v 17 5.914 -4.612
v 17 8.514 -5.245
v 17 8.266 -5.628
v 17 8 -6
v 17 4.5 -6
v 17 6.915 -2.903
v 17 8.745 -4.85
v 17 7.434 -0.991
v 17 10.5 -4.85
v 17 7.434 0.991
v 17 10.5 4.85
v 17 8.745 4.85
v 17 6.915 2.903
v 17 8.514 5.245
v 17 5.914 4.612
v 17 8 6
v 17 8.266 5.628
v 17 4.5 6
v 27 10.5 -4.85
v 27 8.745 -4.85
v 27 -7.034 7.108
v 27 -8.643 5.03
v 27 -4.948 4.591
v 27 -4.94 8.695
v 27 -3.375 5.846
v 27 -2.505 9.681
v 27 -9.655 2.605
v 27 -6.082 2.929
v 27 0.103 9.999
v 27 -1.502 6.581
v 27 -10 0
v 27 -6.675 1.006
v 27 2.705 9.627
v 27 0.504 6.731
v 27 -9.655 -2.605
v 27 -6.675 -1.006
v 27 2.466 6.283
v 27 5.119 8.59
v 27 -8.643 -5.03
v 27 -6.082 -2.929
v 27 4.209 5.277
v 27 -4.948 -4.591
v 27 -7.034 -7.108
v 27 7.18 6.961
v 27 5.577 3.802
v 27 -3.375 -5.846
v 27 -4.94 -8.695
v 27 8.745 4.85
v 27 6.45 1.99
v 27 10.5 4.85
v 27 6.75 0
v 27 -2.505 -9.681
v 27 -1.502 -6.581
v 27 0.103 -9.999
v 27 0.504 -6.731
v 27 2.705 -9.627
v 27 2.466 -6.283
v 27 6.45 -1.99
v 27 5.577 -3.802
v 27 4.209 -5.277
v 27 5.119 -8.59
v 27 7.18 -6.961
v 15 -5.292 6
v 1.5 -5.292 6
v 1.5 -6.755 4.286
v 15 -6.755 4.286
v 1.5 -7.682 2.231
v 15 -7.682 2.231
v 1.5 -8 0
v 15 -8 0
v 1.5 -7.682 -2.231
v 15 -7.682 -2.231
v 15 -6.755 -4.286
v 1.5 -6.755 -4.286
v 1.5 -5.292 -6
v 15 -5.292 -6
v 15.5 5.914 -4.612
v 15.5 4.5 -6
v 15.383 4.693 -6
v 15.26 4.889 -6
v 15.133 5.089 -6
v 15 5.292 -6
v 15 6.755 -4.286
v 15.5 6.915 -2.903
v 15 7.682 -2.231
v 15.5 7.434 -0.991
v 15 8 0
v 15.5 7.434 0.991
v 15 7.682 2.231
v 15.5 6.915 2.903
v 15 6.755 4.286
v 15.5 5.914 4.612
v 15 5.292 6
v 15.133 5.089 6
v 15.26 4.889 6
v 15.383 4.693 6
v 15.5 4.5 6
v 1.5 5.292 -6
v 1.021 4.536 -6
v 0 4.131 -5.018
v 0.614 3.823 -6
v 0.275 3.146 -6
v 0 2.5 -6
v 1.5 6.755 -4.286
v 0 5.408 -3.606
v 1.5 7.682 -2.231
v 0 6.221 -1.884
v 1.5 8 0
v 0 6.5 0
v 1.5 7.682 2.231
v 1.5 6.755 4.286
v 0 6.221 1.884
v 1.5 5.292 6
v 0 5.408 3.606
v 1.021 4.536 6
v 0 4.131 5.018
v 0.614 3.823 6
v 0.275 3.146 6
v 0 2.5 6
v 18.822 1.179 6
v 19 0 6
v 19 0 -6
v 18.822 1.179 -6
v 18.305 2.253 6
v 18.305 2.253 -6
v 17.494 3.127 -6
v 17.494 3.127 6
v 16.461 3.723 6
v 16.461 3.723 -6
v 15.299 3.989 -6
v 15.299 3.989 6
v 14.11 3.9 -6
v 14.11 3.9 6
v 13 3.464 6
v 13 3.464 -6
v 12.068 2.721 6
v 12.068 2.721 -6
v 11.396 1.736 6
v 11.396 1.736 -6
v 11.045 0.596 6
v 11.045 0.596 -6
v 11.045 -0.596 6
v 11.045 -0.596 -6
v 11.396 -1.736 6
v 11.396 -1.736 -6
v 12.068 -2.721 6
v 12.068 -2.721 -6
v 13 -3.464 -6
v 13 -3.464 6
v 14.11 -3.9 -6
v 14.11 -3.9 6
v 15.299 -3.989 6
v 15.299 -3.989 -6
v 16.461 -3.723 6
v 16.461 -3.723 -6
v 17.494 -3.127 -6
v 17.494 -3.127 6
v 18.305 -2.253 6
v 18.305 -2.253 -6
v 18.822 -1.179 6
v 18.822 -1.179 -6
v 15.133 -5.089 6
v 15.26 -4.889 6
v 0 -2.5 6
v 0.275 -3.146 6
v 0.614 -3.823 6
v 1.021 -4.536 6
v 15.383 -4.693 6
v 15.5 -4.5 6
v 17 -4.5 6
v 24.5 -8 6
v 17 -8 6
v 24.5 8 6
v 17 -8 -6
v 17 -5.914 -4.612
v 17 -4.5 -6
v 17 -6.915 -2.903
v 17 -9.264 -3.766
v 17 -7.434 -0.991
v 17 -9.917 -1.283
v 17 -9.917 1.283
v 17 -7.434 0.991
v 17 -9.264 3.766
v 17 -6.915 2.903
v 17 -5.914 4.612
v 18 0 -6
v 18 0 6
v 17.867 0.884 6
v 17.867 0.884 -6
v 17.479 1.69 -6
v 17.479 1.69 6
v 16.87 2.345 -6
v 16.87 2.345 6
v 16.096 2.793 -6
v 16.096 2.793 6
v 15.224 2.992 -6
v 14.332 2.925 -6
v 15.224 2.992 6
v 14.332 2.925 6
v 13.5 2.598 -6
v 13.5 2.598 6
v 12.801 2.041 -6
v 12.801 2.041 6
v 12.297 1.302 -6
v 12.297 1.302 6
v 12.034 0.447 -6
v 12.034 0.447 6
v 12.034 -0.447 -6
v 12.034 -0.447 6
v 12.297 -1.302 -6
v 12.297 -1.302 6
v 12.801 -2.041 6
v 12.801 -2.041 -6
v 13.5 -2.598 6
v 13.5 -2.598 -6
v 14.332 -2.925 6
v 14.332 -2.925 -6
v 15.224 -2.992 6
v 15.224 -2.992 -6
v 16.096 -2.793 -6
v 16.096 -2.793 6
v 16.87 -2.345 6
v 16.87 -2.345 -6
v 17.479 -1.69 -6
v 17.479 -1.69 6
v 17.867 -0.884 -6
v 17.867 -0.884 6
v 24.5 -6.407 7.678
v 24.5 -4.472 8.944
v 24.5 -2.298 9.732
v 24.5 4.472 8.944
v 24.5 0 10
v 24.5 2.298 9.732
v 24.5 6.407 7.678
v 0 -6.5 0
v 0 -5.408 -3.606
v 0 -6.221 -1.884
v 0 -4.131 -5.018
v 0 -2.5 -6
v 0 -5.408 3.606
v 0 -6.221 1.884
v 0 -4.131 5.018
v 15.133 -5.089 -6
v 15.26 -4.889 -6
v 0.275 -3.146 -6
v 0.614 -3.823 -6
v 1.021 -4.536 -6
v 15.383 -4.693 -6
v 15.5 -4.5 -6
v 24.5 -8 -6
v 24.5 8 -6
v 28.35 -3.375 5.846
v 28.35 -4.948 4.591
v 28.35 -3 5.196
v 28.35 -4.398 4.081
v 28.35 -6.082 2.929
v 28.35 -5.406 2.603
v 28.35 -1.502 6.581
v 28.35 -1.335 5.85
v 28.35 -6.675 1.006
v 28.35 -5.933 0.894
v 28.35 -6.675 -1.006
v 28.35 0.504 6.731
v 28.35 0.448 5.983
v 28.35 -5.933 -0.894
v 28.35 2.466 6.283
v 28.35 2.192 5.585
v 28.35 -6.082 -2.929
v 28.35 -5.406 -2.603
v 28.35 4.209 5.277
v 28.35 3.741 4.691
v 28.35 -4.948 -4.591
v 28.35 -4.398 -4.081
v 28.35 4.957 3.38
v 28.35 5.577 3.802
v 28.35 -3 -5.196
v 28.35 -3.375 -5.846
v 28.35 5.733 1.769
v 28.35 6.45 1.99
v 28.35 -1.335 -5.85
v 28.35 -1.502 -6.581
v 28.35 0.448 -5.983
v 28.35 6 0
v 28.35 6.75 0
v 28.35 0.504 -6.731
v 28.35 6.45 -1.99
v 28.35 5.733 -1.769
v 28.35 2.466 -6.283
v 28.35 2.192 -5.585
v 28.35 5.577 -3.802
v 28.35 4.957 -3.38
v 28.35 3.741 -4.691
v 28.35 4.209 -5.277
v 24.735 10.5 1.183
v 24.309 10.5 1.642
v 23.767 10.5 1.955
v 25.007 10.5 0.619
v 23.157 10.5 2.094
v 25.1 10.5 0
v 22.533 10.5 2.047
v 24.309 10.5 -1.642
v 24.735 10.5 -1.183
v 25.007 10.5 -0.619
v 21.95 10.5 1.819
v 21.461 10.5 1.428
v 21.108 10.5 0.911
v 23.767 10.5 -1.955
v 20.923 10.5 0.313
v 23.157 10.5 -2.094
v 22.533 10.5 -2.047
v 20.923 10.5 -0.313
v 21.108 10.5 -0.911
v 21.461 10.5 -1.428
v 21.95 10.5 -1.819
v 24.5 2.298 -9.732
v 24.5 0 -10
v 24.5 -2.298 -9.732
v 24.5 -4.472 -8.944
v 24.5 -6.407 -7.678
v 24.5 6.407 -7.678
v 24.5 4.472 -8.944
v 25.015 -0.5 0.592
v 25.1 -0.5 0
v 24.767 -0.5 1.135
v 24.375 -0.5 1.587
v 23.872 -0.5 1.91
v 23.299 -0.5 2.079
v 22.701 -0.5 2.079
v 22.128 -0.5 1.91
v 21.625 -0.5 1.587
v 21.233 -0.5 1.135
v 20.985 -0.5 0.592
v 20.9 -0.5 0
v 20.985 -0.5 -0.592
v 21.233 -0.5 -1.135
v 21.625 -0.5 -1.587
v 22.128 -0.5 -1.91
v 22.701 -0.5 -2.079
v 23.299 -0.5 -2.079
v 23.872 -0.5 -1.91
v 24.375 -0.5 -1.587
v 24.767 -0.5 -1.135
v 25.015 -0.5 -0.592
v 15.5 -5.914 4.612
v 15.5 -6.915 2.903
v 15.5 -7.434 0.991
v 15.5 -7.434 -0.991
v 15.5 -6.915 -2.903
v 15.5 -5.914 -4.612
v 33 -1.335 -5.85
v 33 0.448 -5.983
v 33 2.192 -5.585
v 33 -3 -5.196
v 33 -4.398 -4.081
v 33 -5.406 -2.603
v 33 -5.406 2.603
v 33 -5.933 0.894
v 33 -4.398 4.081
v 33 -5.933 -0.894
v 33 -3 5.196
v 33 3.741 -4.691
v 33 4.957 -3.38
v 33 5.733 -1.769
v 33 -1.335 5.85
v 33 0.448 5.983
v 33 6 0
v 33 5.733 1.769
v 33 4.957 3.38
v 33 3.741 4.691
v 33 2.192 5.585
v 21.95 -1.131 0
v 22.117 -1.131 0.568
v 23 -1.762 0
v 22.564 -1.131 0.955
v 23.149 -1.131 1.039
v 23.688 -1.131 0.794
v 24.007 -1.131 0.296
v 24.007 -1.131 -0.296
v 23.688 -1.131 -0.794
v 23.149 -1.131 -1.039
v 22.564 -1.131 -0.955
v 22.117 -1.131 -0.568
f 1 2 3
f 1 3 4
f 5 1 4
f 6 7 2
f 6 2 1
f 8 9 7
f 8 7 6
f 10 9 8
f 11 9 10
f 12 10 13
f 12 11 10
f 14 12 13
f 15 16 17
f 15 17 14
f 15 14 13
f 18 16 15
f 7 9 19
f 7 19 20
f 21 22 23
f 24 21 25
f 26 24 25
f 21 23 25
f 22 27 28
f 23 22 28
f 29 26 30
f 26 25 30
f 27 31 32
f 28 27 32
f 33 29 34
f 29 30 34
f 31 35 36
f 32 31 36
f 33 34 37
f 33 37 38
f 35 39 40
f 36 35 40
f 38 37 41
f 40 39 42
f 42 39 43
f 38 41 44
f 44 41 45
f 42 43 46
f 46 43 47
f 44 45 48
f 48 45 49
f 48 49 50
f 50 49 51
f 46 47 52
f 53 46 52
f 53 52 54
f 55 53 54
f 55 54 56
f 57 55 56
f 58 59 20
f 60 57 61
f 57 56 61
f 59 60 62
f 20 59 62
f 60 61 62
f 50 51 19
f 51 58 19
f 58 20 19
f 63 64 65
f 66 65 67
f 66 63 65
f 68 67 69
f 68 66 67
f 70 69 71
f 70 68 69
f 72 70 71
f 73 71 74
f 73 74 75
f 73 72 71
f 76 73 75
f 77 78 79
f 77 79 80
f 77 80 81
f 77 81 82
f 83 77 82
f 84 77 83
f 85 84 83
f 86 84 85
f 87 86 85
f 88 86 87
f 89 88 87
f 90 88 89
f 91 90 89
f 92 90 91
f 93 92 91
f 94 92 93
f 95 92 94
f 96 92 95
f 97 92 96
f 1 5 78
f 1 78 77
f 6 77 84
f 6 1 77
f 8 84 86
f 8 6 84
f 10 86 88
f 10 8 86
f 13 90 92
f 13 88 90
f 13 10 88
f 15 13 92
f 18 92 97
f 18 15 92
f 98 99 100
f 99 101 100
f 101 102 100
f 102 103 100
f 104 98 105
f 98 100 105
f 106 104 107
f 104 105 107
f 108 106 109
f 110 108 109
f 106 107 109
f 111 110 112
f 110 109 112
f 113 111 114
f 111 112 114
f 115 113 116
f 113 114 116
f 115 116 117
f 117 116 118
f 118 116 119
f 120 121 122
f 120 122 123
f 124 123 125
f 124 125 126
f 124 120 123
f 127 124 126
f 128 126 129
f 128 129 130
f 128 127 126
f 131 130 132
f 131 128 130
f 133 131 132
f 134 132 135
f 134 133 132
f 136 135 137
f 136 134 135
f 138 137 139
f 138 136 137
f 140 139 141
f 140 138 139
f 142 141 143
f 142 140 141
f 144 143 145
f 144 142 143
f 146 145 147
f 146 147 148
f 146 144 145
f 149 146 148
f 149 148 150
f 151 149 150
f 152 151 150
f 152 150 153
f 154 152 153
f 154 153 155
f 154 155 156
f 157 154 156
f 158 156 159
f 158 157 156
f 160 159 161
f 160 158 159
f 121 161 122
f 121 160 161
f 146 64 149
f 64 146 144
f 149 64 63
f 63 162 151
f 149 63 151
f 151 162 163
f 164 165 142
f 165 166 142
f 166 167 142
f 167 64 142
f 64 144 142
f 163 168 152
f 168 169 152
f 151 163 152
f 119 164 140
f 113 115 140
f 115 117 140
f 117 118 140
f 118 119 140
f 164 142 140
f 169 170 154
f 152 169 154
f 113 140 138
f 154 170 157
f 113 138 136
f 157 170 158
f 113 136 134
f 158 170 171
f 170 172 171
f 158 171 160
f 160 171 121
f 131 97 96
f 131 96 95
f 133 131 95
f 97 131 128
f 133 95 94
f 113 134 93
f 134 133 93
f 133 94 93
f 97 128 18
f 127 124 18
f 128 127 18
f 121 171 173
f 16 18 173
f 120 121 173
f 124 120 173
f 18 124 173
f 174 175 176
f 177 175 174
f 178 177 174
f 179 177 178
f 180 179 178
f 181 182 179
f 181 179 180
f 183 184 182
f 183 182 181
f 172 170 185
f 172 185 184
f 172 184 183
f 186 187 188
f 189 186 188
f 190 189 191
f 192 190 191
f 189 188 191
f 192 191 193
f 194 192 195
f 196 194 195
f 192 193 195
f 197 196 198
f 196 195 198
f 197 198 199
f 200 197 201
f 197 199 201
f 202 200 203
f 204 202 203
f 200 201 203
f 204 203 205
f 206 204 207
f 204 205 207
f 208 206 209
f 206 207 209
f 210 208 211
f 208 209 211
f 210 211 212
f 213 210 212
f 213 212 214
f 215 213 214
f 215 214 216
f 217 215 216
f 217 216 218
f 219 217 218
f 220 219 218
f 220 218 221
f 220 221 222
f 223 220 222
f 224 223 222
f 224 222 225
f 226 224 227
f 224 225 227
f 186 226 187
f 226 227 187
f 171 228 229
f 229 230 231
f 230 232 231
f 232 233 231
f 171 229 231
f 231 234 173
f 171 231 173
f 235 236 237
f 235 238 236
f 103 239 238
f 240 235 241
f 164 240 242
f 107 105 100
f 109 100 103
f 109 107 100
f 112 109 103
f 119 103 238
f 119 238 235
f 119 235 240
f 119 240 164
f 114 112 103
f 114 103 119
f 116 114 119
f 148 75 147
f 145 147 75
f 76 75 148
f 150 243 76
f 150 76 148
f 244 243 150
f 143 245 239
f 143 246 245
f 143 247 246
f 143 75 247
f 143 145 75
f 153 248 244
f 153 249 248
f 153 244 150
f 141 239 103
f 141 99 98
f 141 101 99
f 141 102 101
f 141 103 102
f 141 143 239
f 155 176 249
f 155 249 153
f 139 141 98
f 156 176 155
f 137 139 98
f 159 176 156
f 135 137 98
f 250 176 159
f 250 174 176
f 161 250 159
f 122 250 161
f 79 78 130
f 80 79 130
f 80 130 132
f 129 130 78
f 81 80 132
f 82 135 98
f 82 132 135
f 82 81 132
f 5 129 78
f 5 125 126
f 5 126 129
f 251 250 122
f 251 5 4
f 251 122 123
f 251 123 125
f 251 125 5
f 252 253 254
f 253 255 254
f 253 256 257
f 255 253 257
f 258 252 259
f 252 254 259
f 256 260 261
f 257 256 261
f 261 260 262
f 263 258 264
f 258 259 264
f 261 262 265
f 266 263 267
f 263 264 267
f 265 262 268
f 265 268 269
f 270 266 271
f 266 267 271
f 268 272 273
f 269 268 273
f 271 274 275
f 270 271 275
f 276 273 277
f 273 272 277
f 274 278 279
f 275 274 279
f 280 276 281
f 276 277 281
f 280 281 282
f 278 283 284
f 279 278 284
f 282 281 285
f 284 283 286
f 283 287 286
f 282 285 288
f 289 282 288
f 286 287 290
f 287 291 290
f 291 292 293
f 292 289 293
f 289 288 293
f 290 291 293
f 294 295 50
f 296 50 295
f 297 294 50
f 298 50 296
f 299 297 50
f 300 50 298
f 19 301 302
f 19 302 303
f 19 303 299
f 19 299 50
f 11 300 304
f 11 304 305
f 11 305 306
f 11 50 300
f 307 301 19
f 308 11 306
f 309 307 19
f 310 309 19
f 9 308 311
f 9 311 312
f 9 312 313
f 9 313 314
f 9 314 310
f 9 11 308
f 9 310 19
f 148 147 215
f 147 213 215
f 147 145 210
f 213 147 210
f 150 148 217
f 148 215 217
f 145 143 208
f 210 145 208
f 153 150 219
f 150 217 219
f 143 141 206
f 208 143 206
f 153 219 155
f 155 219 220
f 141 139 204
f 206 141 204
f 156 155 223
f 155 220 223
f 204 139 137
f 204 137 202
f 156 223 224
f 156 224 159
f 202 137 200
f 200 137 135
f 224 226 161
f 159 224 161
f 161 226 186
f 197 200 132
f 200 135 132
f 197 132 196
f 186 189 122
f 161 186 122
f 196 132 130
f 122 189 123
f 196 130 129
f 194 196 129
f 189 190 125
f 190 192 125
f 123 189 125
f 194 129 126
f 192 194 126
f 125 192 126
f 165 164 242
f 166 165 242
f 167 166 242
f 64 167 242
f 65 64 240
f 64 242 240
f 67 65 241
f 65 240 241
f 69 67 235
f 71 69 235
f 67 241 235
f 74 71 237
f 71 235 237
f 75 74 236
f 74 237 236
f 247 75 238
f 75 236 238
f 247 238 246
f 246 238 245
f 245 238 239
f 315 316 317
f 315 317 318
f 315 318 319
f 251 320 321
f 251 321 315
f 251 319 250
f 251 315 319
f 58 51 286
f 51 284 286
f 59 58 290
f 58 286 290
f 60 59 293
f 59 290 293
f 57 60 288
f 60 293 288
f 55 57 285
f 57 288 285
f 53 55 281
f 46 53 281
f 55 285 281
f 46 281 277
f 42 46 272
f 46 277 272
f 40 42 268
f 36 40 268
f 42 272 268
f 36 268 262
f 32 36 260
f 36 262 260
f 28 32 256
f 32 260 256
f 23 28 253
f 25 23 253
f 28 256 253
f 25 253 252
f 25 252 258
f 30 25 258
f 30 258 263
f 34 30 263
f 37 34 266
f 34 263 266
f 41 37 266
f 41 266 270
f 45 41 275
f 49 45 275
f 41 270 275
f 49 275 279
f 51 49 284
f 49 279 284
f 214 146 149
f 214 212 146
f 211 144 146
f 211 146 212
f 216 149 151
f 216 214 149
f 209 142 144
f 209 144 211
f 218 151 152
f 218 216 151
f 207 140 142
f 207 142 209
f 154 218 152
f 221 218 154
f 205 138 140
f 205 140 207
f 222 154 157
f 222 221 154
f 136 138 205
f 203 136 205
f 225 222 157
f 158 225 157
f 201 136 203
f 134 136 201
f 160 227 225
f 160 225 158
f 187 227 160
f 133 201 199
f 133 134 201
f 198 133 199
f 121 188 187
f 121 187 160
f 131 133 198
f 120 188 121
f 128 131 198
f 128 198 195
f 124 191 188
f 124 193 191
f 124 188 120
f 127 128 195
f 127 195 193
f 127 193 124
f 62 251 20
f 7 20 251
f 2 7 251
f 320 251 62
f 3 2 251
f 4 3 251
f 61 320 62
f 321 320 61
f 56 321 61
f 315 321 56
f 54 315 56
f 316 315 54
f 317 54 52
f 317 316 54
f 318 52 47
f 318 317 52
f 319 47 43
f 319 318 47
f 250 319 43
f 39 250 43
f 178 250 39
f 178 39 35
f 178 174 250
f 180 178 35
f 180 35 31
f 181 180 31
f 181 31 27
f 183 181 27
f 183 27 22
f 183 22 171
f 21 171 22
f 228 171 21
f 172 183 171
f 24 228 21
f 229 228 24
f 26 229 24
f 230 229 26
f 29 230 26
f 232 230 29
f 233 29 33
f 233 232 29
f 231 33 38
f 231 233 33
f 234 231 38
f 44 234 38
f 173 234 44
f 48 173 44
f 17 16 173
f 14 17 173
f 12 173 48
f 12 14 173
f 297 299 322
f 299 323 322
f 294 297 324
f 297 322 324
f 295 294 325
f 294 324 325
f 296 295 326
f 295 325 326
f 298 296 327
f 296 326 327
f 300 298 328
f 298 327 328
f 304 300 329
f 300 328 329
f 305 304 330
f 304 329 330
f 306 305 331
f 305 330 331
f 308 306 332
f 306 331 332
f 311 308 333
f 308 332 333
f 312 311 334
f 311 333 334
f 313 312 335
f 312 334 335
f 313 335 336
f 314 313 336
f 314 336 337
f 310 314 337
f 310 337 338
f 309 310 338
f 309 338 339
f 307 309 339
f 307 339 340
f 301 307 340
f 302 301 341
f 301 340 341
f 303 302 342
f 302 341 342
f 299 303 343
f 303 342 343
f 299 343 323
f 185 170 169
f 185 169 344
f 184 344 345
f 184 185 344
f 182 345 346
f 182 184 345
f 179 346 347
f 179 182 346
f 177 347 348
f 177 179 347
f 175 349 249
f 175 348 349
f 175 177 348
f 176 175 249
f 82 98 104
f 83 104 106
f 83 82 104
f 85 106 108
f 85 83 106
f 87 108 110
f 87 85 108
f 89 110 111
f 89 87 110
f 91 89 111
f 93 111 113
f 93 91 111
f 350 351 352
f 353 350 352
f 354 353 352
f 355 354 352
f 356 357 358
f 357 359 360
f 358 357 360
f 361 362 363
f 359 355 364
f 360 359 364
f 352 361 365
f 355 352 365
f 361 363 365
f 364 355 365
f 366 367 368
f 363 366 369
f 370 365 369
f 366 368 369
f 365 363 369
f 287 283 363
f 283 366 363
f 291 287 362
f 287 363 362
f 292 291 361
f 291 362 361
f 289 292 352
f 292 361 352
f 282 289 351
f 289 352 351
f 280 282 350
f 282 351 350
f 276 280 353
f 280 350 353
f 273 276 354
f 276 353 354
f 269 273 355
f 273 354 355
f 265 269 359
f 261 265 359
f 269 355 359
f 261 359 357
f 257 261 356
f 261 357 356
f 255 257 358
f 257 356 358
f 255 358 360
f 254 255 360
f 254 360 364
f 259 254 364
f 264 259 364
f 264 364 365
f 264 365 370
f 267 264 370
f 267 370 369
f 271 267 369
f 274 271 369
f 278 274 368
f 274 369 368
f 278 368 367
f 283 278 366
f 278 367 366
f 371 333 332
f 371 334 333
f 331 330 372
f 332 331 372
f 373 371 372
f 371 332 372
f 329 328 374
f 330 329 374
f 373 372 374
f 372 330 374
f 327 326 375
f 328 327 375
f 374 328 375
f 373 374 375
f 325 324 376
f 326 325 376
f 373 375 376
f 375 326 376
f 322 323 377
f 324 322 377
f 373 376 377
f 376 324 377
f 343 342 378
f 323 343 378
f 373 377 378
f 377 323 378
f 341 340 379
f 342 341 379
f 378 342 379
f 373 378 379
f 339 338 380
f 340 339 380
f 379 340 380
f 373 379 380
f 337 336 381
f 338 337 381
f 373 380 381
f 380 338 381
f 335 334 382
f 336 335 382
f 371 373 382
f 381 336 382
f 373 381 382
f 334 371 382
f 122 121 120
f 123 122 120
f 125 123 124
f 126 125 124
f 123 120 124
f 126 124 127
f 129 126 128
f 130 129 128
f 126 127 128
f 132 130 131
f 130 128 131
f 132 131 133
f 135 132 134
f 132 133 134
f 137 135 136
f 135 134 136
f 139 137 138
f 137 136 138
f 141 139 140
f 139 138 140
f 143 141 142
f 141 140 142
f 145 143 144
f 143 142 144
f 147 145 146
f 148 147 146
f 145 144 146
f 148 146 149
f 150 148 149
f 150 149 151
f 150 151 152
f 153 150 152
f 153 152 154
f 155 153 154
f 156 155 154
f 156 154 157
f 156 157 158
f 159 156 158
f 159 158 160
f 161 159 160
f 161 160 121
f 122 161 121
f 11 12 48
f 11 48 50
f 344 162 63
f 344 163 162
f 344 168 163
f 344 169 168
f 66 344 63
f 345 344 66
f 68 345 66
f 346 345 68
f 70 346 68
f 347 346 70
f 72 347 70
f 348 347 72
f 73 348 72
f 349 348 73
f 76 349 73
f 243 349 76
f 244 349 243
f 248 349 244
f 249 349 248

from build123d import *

# Parameters (mm, degrees)
BOSS_EXTRUDE1_DEPTH     = 33
CHAMFER1_SIZE           = 1.5
G1_8_TAPPED_HOLE1_D     = 4.2
G1_8_TAPPED_HOLE1_DEPTH = 11
G1_8_TAPPED_HOLE1_TIP   = 1.2618073
CUT_EXTRUDE2_START      = -3.85
SKETCH7_W               = 15
SKETCH7_H               = 16
CUT_EXTRUDE2_DEPTH      = 25.5
SKETCH8_R               = 4
CUT_EXTRUDE3_DEPTH      = 17
SKETCH11_R              = 4
SKETCH11_R_2            = 3
BOSS_EXTRUDE2_DEPTH     = 12


with BuildPart() as part:
    # Sketch1 → Boss-Extrude1 (new body)
    with BuildSketch(Plane(origin=(0, 0, 0), x_dir=(0, 0, -1), z_dir=(1, 0, 0))):
        with BuildLine():
            Line((-4.85, 8.745141508), (-4.85, 10.5))
            Line((-4.85, 10.5), (4.85, 10.5))
            Line((4.85, 10.5), (4.85, 8.745141508))
            ThreePointArc((4.85, 8.745141508), (0, -10), (-4.85, 8.745141508))
        make_face()
    extrude(amount=BOSS_EXTRUDE1_DEPTH)

    # Sketch2 → Cut-Revolve1 (revolve, cut)
    with BuildSketch(Plane.XY):
        Polygon((27, 14), (27, 6.75), (28.35, 6.75), (28.35, 6), (33, 6), (33, 14), align=None)
    revolve(axis=Axis((45.5, 0, 0), (-1, 0, 0)), mode=Mode.SUBTRACT)

    # Sketch3 → Cut-Revolve2 (revolve, cut)
    with BuildSketch(Plane.XY):
        Polygon((0, 8), (15, 8), (15.5, 7.5), (17, 7.5), (17, 16), (0, 16), align=None)
    revolve(axis=Axis((0, 0, 0), (1, 0, 0)), mode=Mode.SUBTRACT)

    # Chamfer1
    chamfer1_edges = [part.edges().sort_by_distance(p)[0] for p in [
        (0, -8, 0),
    ]]
    chamfer(chamfer1_edges, length=CHAMFER1_SIZE)

    # G1/8 Tapped Hole1
    with Locations(Plane(origin=(0, 10.5, 0), x_dir=(-1, 0, 0), z_dir=(0, 1, 0))):
        with Locations((-23, 0)):
            Hole(G1_8_TAPPED_HOLE1_D / 2, depth=G1_8_TAPPED_HOLE1_DEPTH)
            with Locations((0, 0, -(G1_8_TAPPED_HOLE1_DEPTH + G1_8_TAPPED_HOLE1_TIP / 2))):  # 118° drill point
                Cone(0, G1_8_TAPPED_HOLE1_D / 2, G1_8_TAPPED_HOLE1_TIP, mode=Mode.SUBTRACT)

    # Sketch7 → Cut-Extrude2 (cut, through all)
    with BuildSketch(Plane(origin=(28.35, 0, 0), x_dir=(0, 0, -1), z_dir=(1, 0, 0)).offset(CUT_EXTRUDE2_START)):
        with Locations((-13.5, 0)):
            Rectangle(SKETCH7_W, SKETCH7_H)
    cut_extrude2 = extrude(amount=-CUT_EXTRUDE2_DEPTH, mode=Mode.SUBTRACT)

    # Mirror1: Cut-Extrude2 across plane
    add(cut_extrude2.mirror(Plane.XY), mode=Mode.SUBTRACT)

    # Sketch8 → Cut-Extrude3 (cut, through all)
    with BuildSketch(Plane.XY.offset(6)):
        with Locations((15, 0)):
            Circle(SKETCH8_R)
    extrude(amount=-CUT_EXTRUDE3_DEPTH, mode=Mode.SUBTRACT)


with BuildPart() as body_2:
    # Sketch11 → Boss-Extrude2 (new body)
    with BuildSketch(Plane.XY.offset(6)):
        with Locations((15, 0)):
            Circle(SKETCH11_R)
        with Locations((15, 0)):
            Circle(SKETCH11_R_2, mode=Mode.SUBTRACT)
    extrude(amount=-BOSS_EXTRUDE2_DEPTH)


solid = Compound([part.part, body_2.part])
